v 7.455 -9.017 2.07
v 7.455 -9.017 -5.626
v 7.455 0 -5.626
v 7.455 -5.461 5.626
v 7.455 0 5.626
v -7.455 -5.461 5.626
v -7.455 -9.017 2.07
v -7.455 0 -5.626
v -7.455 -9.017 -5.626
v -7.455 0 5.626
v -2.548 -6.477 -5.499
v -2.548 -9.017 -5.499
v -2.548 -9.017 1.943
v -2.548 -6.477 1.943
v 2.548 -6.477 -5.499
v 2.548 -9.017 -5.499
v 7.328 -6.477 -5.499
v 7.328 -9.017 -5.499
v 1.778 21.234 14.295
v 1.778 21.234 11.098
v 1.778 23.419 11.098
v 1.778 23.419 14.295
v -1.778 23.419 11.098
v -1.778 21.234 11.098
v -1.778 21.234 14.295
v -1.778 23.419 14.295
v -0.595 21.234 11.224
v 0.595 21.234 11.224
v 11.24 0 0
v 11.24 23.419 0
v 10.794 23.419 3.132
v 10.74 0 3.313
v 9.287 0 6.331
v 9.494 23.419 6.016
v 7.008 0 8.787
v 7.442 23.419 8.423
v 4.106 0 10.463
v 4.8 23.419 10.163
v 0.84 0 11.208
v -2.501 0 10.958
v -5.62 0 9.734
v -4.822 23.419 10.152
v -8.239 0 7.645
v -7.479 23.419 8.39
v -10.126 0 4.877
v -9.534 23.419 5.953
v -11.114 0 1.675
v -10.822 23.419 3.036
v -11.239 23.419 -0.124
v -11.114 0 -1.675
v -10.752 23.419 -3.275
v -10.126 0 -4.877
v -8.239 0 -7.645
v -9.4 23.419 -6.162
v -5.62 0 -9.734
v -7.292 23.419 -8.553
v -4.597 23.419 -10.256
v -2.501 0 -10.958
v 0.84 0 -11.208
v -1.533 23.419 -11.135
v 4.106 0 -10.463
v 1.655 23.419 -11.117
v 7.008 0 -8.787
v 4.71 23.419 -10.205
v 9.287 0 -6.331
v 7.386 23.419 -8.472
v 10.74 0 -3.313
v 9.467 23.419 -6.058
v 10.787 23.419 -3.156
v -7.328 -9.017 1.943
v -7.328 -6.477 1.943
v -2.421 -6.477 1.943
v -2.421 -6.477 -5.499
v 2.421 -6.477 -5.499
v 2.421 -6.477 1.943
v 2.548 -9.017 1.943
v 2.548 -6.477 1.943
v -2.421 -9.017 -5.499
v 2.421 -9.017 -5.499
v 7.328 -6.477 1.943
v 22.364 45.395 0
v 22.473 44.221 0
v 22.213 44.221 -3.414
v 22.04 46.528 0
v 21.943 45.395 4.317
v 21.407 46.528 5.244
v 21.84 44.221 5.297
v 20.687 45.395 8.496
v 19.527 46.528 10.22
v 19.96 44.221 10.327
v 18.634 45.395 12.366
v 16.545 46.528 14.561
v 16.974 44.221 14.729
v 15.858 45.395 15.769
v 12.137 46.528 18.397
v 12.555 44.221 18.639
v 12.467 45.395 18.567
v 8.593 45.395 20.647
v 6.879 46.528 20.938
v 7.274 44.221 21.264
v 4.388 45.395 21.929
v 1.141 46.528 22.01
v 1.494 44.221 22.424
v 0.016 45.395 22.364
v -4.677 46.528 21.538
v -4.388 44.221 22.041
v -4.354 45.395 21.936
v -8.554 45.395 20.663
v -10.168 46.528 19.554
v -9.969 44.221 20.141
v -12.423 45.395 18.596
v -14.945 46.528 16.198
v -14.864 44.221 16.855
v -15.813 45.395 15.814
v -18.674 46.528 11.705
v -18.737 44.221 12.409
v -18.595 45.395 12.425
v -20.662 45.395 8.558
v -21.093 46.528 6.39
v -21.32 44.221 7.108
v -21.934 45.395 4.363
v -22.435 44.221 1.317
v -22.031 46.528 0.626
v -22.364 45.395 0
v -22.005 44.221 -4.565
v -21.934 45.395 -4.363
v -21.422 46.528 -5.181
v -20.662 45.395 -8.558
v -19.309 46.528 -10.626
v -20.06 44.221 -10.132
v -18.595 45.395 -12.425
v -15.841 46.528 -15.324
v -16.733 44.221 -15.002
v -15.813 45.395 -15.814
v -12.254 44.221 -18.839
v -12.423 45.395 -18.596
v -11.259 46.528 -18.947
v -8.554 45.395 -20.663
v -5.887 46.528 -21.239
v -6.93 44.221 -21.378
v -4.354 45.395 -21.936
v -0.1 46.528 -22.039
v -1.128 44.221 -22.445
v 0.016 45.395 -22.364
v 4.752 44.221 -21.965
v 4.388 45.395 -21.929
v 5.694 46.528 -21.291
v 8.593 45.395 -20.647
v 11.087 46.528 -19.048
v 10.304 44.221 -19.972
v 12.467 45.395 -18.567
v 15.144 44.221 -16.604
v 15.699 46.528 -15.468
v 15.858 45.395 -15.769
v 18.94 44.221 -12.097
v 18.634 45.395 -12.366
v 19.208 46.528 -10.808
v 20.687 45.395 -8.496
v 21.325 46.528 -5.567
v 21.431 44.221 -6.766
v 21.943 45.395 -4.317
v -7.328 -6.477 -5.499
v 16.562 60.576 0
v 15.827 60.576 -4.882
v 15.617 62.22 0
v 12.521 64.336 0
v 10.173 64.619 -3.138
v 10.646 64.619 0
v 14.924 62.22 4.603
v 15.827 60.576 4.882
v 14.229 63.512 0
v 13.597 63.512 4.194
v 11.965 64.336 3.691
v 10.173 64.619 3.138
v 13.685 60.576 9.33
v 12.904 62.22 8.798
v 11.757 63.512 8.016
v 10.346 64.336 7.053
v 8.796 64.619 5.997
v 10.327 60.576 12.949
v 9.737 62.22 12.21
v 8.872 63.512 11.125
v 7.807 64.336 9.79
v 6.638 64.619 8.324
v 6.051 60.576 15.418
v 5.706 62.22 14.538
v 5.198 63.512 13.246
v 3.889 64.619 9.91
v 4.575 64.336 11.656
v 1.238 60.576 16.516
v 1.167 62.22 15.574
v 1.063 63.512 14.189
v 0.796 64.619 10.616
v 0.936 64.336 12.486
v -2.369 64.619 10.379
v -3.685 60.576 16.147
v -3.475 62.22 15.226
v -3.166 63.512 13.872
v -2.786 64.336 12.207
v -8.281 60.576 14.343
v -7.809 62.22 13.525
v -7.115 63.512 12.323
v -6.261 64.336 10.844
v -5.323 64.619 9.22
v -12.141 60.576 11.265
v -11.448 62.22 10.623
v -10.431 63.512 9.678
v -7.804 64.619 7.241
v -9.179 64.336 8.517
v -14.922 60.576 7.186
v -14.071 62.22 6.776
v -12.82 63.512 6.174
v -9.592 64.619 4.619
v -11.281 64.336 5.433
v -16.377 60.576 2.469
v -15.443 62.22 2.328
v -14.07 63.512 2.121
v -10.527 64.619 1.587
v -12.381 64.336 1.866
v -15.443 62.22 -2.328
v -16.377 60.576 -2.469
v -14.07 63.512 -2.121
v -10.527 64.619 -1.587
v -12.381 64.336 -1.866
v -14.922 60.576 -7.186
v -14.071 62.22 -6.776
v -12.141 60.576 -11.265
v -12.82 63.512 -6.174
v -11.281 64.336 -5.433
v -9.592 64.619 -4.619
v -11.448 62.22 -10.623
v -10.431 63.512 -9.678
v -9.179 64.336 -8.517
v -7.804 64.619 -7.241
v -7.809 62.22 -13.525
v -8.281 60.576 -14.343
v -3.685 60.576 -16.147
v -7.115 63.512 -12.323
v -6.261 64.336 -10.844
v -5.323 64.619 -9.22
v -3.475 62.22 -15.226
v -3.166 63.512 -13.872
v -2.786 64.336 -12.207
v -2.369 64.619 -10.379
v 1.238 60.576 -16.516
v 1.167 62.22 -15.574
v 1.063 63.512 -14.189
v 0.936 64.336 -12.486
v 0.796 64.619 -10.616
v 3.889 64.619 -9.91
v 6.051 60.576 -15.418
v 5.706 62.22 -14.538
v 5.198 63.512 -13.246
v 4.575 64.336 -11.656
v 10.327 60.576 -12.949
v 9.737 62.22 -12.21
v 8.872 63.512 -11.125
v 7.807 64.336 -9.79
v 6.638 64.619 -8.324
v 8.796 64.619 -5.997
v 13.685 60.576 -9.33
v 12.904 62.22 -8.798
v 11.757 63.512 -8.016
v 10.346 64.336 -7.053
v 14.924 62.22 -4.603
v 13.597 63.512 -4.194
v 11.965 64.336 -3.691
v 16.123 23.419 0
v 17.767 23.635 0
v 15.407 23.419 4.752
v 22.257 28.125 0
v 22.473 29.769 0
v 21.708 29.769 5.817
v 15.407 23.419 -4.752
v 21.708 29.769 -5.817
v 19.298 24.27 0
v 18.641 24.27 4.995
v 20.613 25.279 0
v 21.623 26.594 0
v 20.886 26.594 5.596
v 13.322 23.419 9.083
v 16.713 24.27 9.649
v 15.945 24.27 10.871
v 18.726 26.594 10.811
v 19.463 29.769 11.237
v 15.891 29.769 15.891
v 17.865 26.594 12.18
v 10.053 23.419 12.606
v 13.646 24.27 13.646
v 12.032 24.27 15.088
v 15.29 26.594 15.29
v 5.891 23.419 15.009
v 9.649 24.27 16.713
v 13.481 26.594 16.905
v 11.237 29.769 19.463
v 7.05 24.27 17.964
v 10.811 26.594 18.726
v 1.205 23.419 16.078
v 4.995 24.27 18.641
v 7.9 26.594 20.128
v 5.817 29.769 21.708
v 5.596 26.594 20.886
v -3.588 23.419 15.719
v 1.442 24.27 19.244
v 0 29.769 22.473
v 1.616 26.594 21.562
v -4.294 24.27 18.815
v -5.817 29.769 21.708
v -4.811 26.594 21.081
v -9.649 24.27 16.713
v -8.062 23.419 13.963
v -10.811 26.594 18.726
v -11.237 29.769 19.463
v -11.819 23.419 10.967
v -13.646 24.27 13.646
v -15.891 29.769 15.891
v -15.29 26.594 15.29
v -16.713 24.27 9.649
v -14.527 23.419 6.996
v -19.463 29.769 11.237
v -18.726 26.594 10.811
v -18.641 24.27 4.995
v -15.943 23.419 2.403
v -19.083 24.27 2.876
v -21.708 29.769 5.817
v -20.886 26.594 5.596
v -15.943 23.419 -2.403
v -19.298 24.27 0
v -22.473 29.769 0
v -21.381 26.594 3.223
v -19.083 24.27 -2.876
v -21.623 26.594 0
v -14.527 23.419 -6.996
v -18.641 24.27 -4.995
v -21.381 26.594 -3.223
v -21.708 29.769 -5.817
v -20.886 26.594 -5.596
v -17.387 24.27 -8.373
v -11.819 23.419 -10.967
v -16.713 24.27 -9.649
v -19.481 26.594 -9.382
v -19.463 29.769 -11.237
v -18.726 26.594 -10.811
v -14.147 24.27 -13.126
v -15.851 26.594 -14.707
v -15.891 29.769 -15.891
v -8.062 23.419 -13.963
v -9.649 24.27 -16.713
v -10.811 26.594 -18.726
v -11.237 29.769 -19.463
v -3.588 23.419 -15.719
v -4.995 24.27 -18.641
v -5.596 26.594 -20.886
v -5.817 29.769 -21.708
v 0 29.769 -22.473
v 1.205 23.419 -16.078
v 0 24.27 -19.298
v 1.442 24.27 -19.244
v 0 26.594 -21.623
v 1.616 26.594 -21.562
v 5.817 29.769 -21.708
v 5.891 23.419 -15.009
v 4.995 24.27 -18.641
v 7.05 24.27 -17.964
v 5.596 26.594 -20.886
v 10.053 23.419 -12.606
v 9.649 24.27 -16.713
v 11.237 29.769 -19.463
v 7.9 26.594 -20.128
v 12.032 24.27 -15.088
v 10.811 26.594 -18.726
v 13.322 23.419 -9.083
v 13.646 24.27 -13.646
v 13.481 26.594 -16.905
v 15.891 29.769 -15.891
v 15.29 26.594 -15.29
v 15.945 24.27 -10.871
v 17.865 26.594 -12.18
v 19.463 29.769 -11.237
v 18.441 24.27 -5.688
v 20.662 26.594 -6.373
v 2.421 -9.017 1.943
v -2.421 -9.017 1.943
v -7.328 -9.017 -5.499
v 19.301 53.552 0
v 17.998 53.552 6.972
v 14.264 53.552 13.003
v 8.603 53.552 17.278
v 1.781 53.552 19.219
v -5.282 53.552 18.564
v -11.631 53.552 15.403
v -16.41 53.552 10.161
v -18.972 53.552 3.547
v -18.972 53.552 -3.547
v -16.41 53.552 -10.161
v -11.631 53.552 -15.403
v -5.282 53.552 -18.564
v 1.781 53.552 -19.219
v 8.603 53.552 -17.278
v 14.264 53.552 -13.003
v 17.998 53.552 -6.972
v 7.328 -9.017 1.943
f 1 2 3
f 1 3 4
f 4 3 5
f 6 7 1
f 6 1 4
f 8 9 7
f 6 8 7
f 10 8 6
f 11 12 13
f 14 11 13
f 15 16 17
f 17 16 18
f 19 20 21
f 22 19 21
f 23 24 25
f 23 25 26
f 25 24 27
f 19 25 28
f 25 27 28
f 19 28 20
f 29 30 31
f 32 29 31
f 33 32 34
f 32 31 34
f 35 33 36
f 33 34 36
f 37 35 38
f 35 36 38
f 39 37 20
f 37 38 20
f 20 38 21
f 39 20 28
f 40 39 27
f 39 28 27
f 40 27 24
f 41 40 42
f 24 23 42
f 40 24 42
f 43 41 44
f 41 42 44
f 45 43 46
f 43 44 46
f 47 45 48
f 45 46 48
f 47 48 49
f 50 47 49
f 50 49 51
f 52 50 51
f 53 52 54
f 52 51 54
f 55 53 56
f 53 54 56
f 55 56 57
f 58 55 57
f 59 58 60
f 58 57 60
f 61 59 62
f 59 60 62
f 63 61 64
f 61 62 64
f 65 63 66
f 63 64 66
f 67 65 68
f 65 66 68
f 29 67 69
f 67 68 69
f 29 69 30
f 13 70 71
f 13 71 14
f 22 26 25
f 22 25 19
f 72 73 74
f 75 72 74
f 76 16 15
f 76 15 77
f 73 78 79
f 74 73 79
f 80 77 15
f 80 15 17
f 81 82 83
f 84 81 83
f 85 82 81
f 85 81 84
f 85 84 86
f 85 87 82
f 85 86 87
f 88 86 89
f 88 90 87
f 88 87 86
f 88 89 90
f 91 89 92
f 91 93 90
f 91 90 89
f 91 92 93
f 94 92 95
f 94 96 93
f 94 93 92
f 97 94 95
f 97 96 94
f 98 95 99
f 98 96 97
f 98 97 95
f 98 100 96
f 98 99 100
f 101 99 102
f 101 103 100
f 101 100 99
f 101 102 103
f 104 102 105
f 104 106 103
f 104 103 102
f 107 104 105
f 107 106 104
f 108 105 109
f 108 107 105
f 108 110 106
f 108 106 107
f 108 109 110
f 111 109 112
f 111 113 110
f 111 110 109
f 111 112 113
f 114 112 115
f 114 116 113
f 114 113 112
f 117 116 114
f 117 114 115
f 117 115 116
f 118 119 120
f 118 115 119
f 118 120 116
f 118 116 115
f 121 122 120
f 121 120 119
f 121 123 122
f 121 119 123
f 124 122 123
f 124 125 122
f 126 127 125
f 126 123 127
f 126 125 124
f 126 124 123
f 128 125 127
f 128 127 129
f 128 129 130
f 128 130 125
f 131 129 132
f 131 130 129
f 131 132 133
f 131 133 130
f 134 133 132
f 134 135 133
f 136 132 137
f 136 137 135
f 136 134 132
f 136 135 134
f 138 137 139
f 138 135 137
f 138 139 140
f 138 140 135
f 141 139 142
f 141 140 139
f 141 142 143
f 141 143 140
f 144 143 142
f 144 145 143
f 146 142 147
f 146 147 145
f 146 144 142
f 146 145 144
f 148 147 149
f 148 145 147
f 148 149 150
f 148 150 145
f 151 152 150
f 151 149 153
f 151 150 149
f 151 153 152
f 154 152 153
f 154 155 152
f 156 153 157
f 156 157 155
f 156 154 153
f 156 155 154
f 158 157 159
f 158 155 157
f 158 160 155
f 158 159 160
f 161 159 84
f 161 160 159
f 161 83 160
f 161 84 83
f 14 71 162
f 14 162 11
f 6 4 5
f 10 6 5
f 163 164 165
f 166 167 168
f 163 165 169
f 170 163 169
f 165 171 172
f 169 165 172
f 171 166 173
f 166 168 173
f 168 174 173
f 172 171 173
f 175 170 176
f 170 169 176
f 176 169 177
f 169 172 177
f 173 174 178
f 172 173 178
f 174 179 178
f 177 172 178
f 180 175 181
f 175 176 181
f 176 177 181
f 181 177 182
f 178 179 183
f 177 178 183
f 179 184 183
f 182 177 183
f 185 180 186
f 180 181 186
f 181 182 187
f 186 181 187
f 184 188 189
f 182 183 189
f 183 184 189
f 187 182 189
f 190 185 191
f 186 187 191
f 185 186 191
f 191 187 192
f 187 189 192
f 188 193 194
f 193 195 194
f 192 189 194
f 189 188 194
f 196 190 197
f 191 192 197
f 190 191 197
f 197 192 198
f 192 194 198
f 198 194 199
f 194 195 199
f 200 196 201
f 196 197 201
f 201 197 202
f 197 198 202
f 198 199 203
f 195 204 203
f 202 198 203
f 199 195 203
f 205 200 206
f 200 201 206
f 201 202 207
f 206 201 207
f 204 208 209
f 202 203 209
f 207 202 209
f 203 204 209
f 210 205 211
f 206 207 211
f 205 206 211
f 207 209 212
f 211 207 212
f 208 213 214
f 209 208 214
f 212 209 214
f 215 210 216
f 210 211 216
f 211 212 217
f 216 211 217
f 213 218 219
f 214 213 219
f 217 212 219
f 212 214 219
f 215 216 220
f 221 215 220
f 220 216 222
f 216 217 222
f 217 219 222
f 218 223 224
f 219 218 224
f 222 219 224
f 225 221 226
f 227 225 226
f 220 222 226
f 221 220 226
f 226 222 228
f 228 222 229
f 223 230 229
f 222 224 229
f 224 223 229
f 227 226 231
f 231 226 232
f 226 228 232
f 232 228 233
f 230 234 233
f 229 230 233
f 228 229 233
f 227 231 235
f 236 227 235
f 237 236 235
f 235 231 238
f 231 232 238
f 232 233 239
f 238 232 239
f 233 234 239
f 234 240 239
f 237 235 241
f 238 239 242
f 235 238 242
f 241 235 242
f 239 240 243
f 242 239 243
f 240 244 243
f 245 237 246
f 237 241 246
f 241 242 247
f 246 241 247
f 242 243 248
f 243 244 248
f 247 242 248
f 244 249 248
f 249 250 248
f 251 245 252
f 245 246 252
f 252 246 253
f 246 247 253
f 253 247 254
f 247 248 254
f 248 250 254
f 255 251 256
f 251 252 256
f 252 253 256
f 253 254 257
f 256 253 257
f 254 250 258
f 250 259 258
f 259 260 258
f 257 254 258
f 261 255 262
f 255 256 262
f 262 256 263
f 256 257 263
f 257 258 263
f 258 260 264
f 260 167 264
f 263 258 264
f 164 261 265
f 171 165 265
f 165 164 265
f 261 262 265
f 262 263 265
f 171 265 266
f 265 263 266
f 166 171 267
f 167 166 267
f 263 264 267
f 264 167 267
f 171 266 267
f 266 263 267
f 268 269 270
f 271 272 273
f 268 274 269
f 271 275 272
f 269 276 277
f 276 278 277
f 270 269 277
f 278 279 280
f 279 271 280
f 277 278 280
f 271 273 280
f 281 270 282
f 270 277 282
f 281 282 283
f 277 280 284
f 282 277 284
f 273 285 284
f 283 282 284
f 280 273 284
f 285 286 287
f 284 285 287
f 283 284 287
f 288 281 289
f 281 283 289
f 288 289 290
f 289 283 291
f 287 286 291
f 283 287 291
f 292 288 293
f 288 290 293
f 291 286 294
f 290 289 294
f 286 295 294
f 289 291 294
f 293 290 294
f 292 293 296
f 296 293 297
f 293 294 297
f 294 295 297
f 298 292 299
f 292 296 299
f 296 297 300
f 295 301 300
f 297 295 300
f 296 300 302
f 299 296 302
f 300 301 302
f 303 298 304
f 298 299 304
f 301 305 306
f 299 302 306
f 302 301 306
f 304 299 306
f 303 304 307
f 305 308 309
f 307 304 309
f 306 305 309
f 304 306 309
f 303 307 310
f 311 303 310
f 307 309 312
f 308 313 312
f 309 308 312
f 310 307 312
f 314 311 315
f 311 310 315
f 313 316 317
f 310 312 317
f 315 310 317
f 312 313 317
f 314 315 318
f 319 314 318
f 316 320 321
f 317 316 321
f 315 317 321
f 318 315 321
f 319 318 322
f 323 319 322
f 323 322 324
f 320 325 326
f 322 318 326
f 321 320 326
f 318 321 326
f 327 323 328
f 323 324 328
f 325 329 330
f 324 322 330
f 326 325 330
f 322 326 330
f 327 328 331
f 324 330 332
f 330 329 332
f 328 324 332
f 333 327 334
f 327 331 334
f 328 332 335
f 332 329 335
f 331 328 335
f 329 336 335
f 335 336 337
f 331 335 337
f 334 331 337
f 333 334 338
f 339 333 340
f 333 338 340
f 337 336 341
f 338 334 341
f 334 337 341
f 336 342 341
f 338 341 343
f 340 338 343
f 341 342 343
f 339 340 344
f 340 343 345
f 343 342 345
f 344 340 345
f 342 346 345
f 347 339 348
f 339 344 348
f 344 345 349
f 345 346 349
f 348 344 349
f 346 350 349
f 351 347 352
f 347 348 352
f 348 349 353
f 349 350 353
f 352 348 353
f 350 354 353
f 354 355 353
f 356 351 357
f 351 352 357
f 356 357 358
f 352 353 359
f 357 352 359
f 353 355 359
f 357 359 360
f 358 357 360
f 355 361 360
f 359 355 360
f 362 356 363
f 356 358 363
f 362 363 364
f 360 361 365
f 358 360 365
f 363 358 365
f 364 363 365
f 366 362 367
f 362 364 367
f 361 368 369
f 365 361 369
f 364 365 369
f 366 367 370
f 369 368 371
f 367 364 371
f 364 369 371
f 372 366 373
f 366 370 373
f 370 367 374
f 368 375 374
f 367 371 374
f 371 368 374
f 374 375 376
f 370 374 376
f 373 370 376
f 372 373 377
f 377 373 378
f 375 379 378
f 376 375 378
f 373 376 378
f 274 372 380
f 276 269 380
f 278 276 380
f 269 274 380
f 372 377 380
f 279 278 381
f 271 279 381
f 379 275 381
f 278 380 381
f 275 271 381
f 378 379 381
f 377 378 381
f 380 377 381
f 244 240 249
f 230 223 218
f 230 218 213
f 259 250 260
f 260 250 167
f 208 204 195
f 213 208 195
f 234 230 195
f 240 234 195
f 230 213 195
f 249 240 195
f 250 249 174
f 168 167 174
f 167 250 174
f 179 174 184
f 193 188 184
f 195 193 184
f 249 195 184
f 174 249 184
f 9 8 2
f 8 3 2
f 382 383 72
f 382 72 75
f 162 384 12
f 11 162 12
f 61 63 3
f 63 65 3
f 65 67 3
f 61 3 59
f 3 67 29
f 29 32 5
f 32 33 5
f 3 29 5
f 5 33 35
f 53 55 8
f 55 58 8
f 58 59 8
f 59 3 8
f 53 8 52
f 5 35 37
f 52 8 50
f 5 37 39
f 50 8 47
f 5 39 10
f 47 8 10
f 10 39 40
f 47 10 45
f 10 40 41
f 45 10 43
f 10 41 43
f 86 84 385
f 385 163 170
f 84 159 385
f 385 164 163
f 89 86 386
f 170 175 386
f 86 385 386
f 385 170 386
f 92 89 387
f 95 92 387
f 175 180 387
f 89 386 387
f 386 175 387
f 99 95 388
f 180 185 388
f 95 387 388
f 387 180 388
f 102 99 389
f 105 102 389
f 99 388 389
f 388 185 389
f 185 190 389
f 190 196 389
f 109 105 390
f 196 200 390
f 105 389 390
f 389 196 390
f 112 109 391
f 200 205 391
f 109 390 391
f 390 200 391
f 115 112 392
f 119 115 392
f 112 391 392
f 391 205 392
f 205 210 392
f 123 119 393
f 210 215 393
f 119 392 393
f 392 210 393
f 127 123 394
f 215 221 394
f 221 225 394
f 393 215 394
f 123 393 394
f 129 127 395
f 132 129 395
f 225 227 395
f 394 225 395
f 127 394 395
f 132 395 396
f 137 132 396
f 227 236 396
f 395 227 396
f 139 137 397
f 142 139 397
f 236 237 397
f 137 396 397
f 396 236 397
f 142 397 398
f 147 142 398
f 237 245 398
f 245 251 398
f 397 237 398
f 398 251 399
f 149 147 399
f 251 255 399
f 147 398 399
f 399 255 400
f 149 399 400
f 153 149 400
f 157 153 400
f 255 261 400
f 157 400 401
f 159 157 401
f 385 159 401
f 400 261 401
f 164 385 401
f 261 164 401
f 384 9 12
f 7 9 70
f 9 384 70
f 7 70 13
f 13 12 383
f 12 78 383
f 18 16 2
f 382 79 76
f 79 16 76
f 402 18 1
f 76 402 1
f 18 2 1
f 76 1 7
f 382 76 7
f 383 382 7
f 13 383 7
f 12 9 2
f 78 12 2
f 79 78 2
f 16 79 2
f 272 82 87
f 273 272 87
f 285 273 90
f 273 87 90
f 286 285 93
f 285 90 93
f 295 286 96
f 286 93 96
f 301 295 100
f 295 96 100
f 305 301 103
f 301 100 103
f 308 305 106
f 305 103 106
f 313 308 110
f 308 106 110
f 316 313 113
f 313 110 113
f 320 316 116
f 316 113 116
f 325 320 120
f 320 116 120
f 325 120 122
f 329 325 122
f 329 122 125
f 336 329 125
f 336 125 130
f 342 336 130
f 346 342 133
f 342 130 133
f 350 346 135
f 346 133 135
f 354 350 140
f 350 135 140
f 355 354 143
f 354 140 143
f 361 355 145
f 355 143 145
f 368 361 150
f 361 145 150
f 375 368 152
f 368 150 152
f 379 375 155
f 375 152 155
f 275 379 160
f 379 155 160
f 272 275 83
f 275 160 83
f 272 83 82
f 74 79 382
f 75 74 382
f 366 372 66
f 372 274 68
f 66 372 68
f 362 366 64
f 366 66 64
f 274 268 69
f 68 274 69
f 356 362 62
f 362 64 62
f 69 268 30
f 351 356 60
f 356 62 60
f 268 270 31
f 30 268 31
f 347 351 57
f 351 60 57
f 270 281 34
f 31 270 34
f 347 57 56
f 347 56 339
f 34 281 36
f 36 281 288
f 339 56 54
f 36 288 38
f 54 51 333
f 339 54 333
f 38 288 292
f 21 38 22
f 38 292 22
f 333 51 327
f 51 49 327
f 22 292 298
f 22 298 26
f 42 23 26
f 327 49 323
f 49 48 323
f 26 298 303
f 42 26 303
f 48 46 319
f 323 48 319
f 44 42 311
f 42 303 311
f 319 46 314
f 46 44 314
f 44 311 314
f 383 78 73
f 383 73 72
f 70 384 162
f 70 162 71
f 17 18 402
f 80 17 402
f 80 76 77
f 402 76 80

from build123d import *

# Parameters (mm, degrees)
FILLET2_R                = 6.35
BOSS_EXTRUDE1_DEPTH      = 7.4549
SKETCH3_W                = 4.78028
SKETCH3_H                = 7.4422
SKETCH3_W_2              = 4.84124
CUT_EXTRUDE1_DEPTH       = 2.54
BOSS_EXTRUDE2_REACH      = 88.307
BOSS_EXTRUDE2_END_RADIUS = 11.2395
BOSS_EXTRUDE2_START      = 14.29512
SKETCH4_W                = 3.556
SKETCH4_H                = 2.1844


with BuildPart() as part:
    # Sketch1 → Revolve1 (revolve)
    with BuildSketch(Plane.XY):
        Polygon((0, 0), (11.2395, 0), (11.2395, 23.4188), (22.473370688, 23.4188), (22.473370688, 45.4152), (14.986, 64.619312752), (0, 64.619312752), align=None)
    revolve(axis=Axis((0, 64.619312752, 0), (0, -1, 0)))

    # Fillet2
    fillet2_edges = [part.edges().sort_by_distance(p)[0] for p in [
        (-22.473370688, 23.4188, 0),
        (-22.473370688, 45.4152, 0),
        (-14.986, 64.619312752, 0),
    ]]
    fillet(fillet2_edges, radius=FILLET2_R)

    # Sketch2 → Boss-Extrude1 (add, symmetric)
    with BuildSketch(Plane(origin=(0, 0, 0), x_dir=(0, 0, -1), z_dir=(1, 0, 0))):
        Polygon((5.626190712, 0), (-5.626190712, 0), (-5.626190712, -5.461), (-2.070009288, -9.017181424), (5.626190712, -9.017181424), align=None)
    extrude(amount=BOSS_EXTRUDE1_DEPTH, both=True)

    # Sketch3 → Cut-Extrude1 (cut)
    with BuildSketch(Plane.XZ.offset(9.017181424)):
        with Locations((-4.93776, -1.778090712)):
            Rectangle(SKETCH3_W, SKETCH3_H)
        with Locations((0, -1.778090712)):
            Rectangle(SKETCH3_W_2, SKETCH3_H)
        with Locations((4.93776, -1.778090712)):
            Rectangle(SKETCH3_W, SKETCH3_H)
    extrude(amount=-CUT_EXTRUDE1_DEPTH, mode=Mode.SUBTRACT)

    # Boss-Extrude2: up to this cylinder (the profile starts outside it)
    boss_extrude2_end = Plane(origin=(0, 22.3266, 0), z_dir=(0, 1, 0)) * Cylinder(BOSS_EXTRUDE2_END_RADIUS, 200.093, mode=Mode.PRIVATE)
    # Sketch4 → Boss-Extrude2 (add, up to the surface)
    with BuildSketch(Plane.XY.offset(BOSS_EXTRUDE2_START), mode=Mode.PRIVATE) as boss_extrude2_sk1:
        with Locations((0, 22.3266)):
            Rectangle(SKETCH4_W, SKETCH4_H)
    boss_extrude2_tool1 = extrude(boss_extrude2_sk1.sketch, amount=-BOSS_EXTRUDE2_REACH, mode=Mode.PRIVATE) - boss_extrude2_end
    add(boss_extrude2_tool1.solids().sort_by_distance((0, 22.3266, 14.29512))[0])


solid = part.part
